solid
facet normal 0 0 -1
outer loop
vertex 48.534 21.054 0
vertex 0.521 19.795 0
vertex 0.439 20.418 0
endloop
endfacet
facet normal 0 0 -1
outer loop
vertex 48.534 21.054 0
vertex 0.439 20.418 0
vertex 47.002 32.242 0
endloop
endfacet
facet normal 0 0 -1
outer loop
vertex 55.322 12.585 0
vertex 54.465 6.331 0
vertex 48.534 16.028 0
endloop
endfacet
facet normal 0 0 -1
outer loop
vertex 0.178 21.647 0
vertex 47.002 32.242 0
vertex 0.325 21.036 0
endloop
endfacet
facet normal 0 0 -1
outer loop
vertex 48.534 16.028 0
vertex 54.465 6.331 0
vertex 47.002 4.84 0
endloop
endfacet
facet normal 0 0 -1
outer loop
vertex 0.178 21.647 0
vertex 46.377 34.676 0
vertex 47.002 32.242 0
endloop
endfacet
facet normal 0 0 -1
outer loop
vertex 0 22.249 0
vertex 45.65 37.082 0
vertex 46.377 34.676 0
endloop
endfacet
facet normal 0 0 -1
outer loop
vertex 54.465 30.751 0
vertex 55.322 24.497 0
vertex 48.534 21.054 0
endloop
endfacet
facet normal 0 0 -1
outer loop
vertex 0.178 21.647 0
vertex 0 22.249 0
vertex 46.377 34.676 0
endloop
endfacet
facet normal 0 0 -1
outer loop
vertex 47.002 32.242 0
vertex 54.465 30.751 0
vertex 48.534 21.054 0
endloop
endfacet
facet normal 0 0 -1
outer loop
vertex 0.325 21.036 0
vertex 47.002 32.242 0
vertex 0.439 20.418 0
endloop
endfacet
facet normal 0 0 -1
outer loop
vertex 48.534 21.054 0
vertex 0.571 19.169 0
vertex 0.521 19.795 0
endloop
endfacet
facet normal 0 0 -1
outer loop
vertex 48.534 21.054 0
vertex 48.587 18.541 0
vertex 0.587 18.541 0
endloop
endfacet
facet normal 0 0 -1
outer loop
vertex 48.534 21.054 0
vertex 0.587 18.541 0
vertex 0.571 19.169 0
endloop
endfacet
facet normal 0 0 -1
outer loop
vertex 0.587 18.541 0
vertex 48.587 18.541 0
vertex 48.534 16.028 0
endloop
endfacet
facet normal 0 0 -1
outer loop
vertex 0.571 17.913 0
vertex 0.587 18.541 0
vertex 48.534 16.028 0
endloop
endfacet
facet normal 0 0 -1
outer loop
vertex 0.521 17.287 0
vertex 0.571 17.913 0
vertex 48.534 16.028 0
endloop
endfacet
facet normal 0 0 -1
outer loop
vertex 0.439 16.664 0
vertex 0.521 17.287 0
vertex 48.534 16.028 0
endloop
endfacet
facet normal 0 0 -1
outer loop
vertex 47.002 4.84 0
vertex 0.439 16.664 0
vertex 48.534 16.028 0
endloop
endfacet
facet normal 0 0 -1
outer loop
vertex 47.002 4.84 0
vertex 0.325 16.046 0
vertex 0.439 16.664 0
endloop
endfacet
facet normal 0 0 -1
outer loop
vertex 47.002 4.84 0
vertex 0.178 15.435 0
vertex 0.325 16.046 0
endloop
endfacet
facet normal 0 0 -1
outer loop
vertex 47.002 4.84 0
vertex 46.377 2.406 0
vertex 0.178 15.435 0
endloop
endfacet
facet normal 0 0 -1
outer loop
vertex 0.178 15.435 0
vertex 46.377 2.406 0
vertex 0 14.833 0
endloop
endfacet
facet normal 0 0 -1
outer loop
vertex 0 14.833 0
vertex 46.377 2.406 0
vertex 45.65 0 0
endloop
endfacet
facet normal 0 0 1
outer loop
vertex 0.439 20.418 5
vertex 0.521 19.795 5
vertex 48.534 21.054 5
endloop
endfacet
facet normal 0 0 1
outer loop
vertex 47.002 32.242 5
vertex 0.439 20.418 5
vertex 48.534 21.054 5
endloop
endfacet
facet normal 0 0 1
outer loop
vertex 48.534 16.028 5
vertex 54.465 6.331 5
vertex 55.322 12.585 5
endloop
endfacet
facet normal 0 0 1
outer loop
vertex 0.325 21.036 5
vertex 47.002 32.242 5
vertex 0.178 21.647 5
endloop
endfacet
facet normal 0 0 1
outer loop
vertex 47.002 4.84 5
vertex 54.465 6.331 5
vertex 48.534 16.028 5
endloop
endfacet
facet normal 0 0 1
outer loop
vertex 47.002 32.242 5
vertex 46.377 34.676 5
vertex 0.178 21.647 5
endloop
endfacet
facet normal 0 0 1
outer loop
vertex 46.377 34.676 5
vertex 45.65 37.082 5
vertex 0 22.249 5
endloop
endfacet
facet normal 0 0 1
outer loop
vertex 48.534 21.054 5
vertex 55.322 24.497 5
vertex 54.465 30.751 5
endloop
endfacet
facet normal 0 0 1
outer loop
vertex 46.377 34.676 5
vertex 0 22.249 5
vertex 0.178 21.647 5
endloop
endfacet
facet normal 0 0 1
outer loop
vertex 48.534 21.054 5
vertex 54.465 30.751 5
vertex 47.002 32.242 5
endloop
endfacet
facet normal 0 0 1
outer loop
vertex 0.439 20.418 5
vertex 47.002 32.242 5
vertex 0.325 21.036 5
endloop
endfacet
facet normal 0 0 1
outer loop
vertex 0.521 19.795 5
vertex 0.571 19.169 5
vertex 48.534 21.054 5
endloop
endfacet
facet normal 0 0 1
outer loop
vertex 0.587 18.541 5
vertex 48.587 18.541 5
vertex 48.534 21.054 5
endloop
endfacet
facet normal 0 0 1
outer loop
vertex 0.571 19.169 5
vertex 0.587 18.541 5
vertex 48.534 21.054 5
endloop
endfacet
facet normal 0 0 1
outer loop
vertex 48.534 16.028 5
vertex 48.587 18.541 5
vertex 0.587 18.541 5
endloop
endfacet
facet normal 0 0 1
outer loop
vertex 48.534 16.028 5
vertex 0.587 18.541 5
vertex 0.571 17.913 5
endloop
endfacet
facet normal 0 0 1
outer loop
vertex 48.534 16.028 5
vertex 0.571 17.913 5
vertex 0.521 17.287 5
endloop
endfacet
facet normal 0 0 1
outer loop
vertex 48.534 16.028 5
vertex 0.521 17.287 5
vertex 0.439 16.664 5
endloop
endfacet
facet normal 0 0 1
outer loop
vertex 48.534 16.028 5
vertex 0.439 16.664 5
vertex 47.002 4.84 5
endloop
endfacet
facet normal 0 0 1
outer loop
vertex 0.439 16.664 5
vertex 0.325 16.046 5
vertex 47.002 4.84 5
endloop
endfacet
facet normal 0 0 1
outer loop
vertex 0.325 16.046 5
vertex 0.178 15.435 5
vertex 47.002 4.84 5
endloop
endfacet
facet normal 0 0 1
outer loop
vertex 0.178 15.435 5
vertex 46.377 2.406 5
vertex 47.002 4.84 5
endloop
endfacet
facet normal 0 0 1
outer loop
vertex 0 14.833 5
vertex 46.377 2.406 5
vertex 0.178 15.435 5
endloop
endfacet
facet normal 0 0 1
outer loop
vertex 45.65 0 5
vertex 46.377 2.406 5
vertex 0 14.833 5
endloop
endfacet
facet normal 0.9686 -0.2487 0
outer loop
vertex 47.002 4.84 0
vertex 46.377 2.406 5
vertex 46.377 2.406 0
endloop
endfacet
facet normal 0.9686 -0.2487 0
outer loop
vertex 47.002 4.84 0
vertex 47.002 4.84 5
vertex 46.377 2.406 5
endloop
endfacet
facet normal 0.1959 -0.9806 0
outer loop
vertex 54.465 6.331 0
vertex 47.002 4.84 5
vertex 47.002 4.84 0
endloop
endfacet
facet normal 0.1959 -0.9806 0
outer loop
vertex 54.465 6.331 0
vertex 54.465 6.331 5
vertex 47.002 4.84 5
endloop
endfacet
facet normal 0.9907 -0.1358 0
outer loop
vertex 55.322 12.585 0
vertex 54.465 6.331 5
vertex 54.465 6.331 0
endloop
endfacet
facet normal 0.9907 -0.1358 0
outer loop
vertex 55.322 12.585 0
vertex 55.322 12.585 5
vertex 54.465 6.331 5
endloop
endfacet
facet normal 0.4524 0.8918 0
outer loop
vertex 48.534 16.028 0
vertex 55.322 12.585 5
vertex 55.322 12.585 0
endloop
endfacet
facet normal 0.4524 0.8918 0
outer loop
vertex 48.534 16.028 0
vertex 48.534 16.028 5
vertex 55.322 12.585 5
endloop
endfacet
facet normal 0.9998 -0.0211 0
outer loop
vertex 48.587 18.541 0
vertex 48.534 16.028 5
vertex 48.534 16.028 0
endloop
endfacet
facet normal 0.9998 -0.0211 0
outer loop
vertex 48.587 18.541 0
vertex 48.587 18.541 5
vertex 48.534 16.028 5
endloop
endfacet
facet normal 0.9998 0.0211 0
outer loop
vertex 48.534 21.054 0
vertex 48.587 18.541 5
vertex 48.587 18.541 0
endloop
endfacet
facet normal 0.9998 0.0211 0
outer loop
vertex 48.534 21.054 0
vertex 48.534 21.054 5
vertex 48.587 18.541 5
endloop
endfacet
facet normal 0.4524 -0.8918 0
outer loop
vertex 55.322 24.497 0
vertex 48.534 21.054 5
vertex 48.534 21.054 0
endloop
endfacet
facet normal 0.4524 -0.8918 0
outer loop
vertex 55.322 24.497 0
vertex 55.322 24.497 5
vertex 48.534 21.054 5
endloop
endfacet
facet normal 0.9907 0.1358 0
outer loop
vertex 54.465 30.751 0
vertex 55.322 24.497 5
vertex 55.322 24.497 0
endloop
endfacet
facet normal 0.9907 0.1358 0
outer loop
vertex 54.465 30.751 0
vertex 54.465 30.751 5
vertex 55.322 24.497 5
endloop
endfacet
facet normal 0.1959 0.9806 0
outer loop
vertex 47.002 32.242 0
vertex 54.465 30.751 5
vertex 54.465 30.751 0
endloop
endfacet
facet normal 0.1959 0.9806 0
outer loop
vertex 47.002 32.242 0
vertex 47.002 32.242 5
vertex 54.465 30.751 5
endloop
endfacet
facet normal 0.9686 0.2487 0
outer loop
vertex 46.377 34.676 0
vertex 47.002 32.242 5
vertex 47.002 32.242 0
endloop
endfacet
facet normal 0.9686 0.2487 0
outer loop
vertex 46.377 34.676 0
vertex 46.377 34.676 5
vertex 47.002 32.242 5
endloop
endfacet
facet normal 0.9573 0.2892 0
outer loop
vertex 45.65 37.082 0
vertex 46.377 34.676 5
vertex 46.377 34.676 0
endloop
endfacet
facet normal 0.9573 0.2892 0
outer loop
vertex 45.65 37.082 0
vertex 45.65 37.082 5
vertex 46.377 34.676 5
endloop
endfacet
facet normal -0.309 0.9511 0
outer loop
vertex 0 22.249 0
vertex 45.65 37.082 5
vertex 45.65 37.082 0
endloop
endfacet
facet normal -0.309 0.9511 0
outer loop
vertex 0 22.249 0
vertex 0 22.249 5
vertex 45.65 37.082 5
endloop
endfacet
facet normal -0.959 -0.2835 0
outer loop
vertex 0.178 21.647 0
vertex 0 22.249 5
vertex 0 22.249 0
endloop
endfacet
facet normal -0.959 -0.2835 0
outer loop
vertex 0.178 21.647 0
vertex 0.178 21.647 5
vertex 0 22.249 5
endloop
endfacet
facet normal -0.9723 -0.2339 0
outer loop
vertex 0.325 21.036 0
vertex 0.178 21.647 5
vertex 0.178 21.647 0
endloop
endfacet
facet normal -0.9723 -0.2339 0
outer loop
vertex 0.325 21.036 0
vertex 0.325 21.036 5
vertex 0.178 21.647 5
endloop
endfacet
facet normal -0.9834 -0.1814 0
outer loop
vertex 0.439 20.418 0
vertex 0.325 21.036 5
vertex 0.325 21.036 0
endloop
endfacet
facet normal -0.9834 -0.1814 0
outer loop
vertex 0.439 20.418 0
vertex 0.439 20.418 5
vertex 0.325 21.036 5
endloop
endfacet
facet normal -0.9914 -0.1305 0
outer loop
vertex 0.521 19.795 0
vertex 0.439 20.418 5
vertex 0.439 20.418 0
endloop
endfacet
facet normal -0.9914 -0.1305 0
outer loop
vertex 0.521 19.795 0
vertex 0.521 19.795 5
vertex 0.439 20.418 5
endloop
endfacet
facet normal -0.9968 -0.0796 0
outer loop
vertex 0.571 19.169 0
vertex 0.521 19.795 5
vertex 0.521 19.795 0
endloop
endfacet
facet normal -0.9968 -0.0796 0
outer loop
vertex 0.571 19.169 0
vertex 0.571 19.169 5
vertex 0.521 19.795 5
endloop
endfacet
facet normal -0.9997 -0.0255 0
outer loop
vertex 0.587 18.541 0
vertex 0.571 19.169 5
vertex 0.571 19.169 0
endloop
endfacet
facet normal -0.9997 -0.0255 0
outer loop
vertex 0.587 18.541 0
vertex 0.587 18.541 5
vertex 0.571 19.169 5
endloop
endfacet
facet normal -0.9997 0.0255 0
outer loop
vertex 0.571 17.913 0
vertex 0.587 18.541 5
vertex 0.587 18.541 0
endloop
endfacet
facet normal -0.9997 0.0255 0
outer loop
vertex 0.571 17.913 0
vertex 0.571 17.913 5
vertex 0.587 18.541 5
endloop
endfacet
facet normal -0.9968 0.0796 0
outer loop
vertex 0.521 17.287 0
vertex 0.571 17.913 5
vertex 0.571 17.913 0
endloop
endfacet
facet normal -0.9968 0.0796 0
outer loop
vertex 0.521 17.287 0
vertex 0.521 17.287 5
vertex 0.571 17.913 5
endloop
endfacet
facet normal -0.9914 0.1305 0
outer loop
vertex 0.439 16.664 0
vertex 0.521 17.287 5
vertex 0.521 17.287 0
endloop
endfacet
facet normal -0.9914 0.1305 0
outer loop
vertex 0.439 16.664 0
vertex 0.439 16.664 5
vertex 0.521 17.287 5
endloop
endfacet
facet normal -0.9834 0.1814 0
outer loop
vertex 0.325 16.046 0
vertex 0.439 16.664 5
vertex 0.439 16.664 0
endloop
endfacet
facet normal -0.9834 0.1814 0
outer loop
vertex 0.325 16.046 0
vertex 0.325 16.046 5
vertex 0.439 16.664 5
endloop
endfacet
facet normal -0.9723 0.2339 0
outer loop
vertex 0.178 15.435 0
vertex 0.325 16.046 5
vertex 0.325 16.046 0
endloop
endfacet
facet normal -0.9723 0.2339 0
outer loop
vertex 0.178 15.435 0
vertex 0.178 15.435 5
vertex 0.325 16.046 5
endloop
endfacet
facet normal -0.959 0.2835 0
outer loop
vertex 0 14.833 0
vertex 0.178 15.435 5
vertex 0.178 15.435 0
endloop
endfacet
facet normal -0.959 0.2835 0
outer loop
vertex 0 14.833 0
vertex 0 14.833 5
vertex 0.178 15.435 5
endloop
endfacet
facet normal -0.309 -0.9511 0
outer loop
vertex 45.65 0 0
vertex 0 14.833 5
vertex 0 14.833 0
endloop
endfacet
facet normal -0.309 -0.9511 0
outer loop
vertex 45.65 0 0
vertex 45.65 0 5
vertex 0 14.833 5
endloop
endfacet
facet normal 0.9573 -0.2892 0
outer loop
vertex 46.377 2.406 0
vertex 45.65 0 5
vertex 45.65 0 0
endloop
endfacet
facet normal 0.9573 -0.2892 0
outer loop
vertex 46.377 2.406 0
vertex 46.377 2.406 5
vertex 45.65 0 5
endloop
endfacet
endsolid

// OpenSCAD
$fn = 32;

// ----------------------------------------------------------------------
// Gear sector: 2 teeth on 36 degrees
// ----------------------------------------------------------------------

// --- parameters (mm) ---
sector_angle = 36;        // sector angle, degrees
root_r = 60;              // root circle radius
tooth_h = 7;              // tooth height over the root circle
teeth = 2;                // number of teeth on the sector
hub_r = 12;               // hub bore radius
plate_t = 5;              // sector thickness, Z
arc_step = 3;             // sampling step of the root/hub arcs, degrees
fit_tol = 0.05;           // declared fit tolerance (prompt contract)
free_tol = 0.2;           // declared free tolerance (prompt contract)

tip_r = root_r + tooth_h;  // tip circle radius

profile = [[45.65, 0], [46.377, 2.406], [47.002, 4.84], [54.465, 6.331], [55.322, 12.585], [48.534, 16.028], [48.587, 18.541], [48.534, 21.054], [55.322, 24.497], [54.465, 30.751], [47.002, 32.242], [46.377, 34.676], [45.65, 37.082], [0, 22.249], [0.178, 21.647], [0.325, 21.036], [0.439, 20.418], [0.521, 19.795], [0.571, 19.169], [0.587, 18.541], [0.571, 17.913], [0.521, 17.287], [0.439, 16.664], [0.325, 16.046], [0.178, 15.435], [0, 14.833]];  // primary outline, 26 points, counter clockwise

// --- the one profile operation ---
linear_extrude(height = plate_t) polygon(points = profile);
